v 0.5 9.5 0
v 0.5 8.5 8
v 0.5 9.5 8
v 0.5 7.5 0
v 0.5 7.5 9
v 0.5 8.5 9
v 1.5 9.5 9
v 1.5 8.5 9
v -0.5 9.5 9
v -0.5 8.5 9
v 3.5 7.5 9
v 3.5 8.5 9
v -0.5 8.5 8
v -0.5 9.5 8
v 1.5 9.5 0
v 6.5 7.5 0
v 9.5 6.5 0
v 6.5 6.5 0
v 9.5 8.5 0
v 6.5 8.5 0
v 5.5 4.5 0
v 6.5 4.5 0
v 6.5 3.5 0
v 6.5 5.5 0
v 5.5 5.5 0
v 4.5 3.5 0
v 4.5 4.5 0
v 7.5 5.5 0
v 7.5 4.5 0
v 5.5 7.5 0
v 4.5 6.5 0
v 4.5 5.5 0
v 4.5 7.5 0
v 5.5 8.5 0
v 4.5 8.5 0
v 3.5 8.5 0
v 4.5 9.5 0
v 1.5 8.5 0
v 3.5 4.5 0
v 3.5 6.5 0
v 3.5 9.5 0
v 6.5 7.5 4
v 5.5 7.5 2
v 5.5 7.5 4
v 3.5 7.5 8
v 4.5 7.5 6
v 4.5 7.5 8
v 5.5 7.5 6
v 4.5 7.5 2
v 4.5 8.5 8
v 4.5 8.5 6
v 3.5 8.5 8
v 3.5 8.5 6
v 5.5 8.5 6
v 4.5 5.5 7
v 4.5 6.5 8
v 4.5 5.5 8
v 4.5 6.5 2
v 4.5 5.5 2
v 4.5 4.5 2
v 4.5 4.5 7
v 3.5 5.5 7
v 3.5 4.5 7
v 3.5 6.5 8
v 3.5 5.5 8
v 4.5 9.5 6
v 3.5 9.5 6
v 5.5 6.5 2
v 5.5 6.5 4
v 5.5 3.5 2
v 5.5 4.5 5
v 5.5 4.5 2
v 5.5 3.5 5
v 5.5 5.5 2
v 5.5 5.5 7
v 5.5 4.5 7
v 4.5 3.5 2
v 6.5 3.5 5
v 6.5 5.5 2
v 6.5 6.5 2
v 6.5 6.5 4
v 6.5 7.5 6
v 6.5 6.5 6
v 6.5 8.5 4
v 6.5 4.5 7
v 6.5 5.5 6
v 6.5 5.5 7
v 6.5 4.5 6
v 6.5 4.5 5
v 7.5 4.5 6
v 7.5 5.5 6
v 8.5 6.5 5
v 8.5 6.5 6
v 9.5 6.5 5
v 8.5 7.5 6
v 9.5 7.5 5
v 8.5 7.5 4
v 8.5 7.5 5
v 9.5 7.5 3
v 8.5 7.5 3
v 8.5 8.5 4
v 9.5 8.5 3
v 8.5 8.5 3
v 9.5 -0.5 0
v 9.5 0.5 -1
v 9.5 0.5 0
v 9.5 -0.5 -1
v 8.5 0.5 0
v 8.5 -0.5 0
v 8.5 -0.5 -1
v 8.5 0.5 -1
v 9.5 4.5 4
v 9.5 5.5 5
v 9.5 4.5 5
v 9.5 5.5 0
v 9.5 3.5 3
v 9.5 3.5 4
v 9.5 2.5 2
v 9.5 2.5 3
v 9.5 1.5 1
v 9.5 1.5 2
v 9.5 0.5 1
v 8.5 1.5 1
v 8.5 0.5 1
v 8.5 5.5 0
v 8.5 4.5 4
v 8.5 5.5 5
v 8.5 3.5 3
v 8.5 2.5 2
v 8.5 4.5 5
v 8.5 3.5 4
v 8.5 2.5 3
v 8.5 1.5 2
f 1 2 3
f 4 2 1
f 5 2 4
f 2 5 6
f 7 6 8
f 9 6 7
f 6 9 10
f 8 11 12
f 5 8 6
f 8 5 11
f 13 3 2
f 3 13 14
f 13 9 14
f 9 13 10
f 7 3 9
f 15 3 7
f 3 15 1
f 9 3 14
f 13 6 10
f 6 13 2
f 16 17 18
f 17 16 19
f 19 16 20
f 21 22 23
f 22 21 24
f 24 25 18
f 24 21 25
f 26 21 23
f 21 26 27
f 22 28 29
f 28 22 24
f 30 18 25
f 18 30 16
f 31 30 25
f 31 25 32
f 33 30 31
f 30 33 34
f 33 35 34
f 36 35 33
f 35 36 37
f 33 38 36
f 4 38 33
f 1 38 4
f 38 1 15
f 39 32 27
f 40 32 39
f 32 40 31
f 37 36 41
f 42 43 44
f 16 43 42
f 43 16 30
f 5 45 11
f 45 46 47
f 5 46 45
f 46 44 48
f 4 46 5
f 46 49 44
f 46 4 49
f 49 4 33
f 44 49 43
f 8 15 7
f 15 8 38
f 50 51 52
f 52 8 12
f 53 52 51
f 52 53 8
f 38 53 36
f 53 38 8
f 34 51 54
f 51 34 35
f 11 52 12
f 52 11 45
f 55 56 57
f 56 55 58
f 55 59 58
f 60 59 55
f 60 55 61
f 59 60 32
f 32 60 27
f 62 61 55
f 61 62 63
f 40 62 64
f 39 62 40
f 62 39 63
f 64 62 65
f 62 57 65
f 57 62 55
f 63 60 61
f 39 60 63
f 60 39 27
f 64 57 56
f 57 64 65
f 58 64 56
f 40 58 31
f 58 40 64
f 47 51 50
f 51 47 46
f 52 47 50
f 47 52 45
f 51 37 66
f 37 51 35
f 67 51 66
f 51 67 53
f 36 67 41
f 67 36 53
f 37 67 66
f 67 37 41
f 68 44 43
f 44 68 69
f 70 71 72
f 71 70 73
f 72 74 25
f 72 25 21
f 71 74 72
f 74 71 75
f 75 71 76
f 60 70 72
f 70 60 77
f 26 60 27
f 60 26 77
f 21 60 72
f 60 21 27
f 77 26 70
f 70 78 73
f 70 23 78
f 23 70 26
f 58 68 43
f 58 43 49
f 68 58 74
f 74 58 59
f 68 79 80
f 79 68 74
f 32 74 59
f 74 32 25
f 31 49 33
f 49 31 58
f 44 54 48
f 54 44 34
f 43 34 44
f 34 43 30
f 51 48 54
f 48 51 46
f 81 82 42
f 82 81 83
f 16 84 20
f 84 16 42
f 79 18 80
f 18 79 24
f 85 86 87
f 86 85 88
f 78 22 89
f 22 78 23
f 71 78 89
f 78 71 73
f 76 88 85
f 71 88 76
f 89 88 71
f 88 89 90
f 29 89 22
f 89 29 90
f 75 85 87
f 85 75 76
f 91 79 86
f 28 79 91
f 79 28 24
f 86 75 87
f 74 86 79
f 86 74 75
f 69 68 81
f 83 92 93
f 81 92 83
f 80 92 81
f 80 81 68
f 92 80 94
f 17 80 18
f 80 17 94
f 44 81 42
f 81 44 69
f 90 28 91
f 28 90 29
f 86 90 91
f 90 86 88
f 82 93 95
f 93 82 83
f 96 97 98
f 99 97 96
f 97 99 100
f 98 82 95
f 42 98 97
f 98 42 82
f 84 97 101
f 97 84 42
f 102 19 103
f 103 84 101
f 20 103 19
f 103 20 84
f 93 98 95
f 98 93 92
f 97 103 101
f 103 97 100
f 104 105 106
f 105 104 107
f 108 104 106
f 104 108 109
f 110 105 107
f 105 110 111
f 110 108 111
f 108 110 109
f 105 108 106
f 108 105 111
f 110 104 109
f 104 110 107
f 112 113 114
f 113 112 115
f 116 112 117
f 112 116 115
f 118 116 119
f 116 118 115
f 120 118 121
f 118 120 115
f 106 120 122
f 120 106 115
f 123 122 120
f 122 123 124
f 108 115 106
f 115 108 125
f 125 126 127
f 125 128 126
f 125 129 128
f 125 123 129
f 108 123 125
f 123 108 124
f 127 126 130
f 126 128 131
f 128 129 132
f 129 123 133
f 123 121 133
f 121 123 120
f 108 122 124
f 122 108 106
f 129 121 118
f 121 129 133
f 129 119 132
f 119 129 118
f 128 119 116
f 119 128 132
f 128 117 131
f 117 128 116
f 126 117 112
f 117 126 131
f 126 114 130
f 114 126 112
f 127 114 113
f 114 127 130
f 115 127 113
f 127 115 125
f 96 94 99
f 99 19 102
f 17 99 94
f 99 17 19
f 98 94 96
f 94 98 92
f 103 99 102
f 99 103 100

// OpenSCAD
union() {
    translate([0, 9, 8.5]) color([0, 0, 1]) cube([1, 1, 1], center=true);
    translate([1, 8, 4.5]) cube([1, 1, 9], center=true);
    translate([1, 9, 4.5]) cube([1, 1, 9], center=true);
    translate([2, 8, 4.5]) cube([1, 1, 9], center=true);
    translate([3, 8, 4.5]) cube([1, 1, 9], center=true);
    translate([4, 5, 3.5]) cube([1, 1, 7], center=true);
    translate([4, 6, 4.0]) cube([1, 1, 8], center=true);
    translate([4, 8, 4.0]) cube([1, 1, 8], center=true);
    translate([4, 9, 3.0]) cube([1, 1, 6], center=true);
    translate([5, 4, 1.0]) cube([1, 1, 2], center=true);
    translate([5, 6, 1.0]) cube([1, 1, 2], center=true);
    translate([5, 7, 1.0]) cube([1, 1, 2], center=true);
    translate([5, 8, 3.0]) cube([1, 1, 6], center=true);
    translate([6, 4, 2.5]) cube([1, 1, 5], center=true);
    translate([6, 5, 3.5]) cube([1, 1, 7], center=true);
    translate([6, 6, 1.0]) cube([1, 1, 2], center=true);
    translate([6, 7, 2.0]) cube([1, 1, 4], center=true);
    translate([7, 5, 3.0]) cube([1, 1, 6], center=true);
    translate([7, 7, 3.0]) cube([1, 1, 6], center=true);
    translate([7, 8, 2.0]) cube([1, 1, 4], center=true);
    translate([8, 7, 3.0]) cube([1, 1, 6], center=true);
    translate([8, 8, 2.0]) cube([1, 1, 4], center=true);
    translate([9, 0, -0.5]) color([1, 0, 0]) cube([1, 1, 1], center=true);
    translate([9, 1, 0.5]) cube([1, 1, 1], center=true);
    translate([9, 2, 1.0]) cube([1, 1, 2], center=true);
    translate([9, 3, 1.5]) cube([1, 1, 3], center=true);
    translate([9, 4, 2.0]) cube([1, 1, 4], center=true);
    translate([9, 5, 2.5]) cube([1, 1, 5], center=true);
    translate([9, 7, 2.5]) cube([1, 1, 5], center=true);
    translate([9, 8, 1.5]) cube([1, 1, 3], center=true);
}
